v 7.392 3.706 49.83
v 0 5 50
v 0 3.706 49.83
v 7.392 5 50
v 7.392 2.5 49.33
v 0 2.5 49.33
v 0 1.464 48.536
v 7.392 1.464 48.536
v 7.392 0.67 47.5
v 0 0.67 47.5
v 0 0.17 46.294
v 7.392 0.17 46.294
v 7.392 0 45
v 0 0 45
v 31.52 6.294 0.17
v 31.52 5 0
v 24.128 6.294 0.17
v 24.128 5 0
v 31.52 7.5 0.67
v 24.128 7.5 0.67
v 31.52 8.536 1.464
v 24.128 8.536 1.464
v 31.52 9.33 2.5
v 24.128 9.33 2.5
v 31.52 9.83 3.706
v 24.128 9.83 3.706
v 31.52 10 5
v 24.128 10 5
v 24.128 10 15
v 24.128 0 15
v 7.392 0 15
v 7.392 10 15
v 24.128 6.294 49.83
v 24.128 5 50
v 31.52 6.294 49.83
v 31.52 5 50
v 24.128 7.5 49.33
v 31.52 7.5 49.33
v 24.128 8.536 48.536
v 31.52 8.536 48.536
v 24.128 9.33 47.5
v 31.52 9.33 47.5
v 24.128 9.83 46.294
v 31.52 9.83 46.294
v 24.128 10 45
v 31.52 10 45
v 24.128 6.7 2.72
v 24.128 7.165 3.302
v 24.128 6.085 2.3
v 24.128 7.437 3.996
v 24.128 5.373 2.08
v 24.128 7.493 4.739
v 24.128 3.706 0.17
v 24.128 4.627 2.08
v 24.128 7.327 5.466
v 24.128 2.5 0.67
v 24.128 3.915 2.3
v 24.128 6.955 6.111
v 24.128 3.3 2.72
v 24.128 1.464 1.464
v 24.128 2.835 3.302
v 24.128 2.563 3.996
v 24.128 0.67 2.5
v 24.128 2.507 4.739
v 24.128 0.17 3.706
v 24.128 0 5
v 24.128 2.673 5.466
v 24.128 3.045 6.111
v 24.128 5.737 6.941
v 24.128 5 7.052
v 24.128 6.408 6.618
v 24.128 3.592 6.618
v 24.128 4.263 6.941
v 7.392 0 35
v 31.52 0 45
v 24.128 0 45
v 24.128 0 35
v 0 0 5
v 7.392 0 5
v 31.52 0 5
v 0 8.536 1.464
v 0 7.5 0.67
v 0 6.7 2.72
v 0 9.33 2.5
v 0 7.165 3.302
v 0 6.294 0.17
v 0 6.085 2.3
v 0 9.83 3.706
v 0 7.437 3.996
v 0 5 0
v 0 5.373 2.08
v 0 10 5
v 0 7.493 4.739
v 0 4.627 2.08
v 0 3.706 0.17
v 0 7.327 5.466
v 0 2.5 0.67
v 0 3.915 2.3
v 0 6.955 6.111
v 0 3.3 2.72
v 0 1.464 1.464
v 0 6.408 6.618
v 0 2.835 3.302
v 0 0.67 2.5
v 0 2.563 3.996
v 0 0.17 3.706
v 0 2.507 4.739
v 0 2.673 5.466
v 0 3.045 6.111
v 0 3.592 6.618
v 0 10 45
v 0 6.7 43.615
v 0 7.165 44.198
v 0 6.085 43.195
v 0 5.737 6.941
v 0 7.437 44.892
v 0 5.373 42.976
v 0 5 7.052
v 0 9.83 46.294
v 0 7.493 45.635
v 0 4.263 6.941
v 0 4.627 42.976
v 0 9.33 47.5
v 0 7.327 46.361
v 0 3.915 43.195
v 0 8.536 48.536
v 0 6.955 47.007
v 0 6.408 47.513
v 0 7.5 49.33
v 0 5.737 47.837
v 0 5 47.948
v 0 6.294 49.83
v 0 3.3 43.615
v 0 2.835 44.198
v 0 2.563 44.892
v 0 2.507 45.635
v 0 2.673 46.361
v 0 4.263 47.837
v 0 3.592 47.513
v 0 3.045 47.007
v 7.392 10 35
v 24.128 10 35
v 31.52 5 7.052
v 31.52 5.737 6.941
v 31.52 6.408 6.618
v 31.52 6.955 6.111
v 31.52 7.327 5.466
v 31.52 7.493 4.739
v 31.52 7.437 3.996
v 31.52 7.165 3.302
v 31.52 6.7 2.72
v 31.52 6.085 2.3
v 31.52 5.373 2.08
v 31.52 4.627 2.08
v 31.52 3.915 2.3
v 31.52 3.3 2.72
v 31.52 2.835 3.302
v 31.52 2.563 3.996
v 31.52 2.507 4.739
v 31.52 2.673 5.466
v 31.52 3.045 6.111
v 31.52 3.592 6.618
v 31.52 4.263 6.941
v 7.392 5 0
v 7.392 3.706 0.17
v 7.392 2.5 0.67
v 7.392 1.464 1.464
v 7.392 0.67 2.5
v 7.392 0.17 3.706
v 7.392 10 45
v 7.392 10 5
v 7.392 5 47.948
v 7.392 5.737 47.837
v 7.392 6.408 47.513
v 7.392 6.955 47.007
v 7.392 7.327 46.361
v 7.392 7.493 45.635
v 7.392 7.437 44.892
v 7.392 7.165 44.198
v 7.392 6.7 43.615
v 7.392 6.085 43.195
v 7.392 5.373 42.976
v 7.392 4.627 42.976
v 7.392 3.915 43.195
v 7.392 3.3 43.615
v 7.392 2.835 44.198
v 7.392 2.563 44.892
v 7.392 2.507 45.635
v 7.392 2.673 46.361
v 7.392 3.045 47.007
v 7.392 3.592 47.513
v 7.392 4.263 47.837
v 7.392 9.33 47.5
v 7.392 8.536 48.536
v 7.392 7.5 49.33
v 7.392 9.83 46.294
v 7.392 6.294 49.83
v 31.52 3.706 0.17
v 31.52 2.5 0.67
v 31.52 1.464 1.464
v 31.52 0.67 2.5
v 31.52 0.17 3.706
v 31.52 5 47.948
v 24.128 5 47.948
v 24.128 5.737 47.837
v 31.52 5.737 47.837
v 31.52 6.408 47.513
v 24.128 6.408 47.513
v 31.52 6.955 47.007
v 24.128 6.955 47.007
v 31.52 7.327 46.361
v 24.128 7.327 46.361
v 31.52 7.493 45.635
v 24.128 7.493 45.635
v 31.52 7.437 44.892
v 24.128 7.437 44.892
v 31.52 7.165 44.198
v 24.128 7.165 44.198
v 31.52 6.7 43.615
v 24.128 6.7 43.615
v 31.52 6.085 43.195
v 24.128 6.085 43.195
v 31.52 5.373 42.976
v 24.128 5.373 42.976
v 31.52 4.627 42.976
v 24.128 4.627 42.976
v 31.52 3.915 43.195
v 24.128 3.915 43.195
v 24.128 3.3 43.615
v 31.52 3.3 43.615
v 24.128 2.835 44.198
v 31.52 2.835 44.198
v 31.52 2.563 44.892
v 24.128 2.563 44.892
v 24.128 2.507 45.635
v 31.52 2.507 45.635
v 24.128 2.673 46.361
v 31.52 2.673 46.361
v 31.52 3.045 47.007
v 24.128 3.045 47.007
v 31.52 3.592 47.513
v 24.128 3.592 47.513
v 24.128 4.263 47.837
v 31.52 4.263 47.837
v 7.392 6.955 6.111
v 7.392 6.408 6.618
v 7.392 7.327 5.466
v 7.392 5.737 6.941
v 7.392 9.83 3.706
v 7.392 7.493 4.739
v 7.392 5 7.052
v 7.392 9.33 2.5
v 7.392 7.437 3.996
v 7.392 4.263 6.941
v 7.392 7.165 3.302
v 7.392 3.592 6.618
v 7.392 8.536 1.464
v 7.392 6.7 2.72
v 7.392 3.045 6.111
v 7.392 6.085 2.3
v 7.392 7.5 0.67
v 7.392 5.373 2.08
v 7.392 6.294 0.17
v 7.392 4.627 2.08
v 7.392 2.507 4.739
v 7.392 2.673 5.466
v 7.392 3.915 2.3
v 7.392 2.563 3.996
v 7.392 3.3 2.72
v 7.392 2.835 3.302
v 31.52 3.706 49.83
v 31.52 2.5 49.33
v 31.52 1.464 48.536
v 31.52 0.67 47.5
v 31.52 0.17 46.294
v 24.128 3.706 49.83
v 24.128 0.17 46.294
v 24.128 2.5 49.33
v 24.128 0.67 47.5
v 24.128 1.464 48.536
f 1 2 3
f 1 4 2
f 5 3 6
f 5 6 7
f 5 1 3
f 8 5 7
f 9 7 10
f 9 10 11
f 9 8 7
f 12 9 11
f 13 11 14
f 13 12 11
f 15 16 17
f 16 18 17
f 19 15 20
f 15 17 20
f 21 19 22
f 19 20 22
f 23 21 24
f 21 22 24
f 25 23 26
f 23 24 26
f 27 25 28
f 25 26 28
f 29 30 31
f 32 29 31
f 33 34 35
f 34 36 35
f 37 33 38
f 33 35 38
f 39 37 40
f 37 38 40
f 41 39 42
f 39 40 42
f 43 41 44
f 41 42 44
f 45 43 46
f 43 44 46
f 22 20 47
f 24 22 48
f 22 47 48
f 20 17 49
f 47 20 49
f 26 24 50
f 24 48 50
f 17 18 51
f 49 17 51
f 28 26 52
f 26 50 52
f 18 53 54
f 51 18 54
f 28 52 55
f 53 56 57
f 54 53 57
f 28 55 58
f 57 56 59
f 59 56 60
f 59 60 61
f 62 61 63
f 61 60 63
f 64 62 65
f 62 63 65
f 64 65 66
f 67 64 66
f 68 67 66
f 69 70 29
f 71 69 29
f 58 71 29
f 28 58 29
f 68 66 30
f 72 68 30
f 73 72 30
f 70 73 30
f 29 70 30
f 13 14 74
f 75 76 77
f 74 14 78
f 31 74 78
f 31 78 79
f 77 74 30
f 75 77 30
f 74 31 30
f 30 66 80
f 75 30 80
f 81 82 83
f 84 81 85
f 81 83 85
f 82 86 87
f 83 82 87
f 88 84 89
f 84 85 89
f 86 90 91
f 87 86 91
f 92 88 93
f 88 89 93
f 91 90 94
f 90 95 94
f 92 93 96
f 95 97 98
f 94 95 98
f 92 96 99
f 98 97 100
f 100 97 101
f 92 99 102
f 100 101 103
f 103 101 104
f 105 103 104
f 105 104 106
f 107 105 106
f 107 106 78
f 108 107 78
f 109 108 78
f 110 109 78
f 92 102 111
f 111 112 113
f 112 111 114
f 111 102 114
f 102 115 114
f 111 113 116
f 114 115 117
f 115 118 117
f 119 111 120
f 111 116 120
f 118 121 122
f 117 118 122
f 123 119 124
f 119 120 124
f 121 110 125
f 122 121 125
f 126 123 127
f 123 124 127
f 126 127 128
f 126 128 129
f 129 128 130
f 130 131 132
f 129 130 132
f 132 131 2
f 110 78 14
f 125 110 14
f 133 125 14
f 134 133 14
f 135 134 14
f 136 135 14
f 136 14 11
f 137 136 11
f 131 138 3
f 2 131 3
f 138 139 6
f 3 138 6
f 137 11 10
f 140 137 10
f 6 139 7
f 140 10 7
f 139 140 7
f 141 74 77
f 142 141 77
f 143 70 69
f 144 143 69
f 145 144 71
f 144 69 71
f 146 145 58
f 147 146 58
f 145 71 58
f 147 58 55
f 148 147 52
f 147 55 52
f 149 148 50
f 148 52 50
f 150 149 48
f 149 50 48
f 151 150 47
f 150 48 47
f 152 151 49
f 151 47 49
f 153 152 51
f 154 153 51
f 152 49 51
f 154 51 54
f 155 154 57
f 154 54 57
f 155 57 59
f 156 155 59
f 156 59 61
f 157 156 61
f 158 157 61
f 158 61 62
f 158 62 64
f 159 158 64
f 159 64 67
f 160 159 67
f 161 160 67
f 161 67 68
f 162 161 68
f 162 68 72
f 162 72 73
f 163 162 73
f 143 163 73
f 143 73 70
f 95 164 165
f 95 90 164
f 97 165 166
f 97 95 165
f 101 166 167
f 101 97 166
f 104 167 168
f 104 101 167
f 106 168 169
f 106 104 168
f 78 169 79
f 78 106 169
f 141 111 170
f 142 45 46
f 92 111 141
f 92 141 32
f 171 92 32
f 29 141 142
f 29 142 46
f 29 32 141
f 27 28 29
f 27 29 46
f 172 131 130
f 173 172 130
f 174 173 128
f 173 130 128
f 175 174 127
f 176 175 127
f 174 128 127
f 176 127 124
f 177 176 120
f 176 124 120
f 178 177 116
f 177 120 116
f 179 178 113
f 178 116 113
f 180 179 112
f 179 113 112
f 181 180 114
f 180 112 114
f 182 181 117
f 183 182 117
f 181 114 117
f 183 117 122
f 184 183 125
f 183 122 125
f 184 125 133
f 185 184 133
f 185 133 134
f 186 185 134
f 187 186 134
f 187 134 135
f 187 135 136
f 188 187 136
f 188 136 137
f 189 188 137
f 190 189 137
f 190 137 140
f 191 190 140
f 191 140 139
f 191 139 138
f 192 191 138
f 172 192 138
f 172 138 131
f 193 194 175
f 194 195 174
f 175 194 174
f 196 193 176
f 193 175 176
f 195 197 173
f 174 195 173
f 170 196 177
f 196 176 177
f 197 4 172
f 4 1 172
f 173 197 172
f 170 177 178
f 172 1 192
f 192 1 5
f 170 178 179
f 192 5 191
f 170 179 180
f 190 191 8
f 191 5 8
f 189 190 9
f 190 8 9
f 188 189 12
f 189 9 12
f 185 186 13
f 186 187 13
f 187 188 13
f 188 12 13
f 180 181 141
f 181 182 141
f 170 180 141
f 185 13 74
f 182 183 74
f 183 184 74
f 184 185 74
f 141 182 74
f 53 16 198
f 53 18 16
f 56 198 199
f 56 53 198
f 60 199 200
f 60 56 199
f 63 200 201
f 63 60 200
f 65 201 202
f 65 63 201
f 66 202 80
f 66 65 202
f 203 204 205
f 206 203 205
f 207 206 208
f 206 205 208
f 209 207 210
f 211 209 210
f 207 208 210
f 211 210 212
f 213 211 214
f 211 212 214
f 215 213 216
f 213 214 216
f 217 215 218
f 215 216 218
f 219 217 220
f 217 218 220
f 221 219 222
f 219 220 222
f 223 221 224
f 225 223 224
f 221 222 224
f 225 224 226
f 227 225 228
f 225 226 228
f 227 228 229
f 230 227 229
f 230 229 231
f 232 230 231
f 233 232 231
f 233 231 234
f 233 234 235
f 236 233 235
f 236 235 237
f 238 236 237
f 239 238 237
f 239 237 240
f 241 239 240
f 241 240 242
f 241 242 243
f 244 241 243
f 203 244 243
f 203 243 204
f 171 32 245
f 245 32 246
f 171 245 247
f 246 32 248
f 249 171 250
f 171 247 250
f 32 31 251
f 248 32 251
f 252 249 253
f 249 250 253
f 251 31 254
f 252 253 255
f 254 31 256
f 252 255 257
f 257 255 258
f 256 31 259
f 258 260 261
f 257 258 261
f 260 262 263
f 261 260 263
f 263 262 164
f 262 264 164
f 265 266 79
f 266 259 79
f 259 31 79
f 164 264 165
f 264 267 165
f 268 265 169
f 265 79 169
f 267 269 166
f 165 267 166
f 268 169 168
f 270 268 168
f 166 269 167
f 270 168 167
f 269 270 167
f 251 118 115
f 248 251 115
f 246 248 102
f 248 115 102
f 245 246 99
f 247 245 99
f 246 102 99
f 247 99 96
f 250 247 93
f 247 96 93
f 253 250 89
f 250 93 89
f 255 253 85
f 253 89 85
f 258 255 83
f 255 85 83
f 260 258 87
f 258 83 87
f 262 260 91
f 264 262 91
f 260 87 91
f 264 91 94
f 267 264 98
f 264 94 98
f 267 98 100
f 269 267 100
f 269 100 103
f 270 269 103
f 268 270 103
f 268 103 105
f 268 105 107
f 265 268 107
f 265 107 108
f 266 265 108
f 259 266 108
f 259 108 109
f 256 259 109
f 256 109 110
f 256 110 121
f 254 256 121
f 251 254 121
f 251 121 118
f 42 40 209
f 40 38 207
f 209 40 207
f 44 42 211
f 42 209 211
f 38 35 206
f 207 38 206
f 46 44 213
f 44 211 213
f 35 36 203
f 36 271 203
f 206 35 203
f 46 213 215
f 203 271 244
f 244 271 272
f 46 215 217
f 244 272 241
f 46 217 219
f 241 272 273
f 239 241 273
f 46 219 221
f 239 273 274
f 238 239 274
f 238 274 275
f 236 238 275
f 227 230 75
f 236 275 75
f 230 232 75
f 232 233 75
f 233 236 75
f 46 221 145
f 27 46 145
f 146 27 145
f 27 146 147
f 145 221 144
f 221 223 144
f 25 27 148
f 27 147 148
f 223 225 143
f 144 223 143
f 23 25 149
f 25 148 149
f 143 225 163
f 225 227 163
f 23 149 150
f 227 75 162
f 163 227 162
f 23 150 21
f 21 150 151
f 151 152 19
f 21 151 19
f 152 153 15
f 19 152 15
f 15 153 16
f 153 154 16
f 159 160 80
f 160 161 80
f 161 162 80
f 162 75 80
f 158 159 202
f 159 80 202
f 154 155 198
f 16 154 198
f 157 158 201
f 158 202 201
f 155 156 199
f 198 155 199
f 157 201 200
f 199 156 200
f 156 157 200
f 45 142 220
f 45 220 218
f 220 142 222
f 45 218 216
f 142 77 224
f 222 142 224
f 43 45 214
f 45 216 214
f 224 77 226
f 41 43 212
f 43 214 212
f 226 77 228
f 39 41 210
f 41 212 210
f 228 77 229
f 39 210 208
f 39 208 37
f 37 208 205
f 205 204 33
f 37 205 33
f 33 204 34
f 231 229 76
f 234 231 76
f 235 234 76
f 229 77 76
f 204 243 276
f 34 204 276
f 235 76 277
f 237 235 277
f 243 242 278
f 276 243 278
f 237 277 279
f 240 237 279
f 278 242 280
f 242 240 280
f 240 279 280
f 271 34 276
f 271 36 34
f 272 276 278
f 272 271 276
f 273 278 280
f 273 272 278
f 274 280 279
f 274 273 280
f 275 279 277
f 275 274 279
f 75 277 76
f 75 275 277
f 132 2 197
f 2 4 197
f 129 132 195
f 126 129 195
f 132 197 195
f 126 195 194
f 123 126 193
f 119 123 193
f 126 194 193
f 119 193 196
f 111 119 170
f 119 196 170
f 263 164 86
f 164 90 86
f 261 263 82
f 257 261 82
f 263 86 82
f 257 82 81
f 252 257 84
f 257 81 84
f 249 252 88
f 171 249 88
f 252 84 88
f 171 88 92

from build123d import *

# Parameters (mm, degrees)
BOSS_EXTRU_1_DEPTH      = 10
CONG_1_R                = 5
ESQUISSE2_R             = 2.5
ENL_V_MAT_EXTRU_1_DEPTH = 50


with BuildPart() as part:
    # Esquisse1 → Boss.-Extru.1 (new body)
    with BuildSketch(Plane(origin=(0, 0, 0), x_dir=(1, 0, 0), z_dir=(0, 1, 0))):
        Polygon((7.392201948, 0), (0, 0), (0, -50), (7.392201948, -50), (7.392201948, -35), (15.760023564, -35), (15.760023564, -15), (7.392201948, -15), align=None)
        Polygon((24.127845179, -15), (15.760023564, -15), (15.760023564, -35), (24.127845179, -35), (24.127845179, -50), (31.520047127, -50), (31.520047127, 0), (24.127845179, 0), align=None)
    extrude(amount=BOSS_EXTRU_1_DEPTH)

    # Congé1
    cong_1_edges = [part.edges().sort_by_distance(p)[0] for p in [
        (27.823946153, 0, 50),
        (3.696100974, 0, 50),
        (3.696100974, 10, 50),
        (27.823946153, 10, 50),
        (27.823946153, 10, 0),
        (27.823946153, 0, 0),
        (3.696100974, 0, 0),
        (3.696100974, 10, 0),
    ]]
    fillet(cong_1_edges, radius=CONG_1_R - 0.0001)  # a hair under: the kernel refuses the full size

    # Esquisse2 → Enlèv. mat.-Extru.1 (cut)
    with BuildSketch(Plane.ZY):
        with Locations((4.552174391, 5)):
            Circle(ESQUISSE2_R)
        with Locations((45.447825609, 5)):
            Circle(ESQUISSE2_R)
    extrude(amount=-ENL_V_MAT_EXTRU_1_DEPTH, mode=Mode.SUBTRACT)


solid = part.part
